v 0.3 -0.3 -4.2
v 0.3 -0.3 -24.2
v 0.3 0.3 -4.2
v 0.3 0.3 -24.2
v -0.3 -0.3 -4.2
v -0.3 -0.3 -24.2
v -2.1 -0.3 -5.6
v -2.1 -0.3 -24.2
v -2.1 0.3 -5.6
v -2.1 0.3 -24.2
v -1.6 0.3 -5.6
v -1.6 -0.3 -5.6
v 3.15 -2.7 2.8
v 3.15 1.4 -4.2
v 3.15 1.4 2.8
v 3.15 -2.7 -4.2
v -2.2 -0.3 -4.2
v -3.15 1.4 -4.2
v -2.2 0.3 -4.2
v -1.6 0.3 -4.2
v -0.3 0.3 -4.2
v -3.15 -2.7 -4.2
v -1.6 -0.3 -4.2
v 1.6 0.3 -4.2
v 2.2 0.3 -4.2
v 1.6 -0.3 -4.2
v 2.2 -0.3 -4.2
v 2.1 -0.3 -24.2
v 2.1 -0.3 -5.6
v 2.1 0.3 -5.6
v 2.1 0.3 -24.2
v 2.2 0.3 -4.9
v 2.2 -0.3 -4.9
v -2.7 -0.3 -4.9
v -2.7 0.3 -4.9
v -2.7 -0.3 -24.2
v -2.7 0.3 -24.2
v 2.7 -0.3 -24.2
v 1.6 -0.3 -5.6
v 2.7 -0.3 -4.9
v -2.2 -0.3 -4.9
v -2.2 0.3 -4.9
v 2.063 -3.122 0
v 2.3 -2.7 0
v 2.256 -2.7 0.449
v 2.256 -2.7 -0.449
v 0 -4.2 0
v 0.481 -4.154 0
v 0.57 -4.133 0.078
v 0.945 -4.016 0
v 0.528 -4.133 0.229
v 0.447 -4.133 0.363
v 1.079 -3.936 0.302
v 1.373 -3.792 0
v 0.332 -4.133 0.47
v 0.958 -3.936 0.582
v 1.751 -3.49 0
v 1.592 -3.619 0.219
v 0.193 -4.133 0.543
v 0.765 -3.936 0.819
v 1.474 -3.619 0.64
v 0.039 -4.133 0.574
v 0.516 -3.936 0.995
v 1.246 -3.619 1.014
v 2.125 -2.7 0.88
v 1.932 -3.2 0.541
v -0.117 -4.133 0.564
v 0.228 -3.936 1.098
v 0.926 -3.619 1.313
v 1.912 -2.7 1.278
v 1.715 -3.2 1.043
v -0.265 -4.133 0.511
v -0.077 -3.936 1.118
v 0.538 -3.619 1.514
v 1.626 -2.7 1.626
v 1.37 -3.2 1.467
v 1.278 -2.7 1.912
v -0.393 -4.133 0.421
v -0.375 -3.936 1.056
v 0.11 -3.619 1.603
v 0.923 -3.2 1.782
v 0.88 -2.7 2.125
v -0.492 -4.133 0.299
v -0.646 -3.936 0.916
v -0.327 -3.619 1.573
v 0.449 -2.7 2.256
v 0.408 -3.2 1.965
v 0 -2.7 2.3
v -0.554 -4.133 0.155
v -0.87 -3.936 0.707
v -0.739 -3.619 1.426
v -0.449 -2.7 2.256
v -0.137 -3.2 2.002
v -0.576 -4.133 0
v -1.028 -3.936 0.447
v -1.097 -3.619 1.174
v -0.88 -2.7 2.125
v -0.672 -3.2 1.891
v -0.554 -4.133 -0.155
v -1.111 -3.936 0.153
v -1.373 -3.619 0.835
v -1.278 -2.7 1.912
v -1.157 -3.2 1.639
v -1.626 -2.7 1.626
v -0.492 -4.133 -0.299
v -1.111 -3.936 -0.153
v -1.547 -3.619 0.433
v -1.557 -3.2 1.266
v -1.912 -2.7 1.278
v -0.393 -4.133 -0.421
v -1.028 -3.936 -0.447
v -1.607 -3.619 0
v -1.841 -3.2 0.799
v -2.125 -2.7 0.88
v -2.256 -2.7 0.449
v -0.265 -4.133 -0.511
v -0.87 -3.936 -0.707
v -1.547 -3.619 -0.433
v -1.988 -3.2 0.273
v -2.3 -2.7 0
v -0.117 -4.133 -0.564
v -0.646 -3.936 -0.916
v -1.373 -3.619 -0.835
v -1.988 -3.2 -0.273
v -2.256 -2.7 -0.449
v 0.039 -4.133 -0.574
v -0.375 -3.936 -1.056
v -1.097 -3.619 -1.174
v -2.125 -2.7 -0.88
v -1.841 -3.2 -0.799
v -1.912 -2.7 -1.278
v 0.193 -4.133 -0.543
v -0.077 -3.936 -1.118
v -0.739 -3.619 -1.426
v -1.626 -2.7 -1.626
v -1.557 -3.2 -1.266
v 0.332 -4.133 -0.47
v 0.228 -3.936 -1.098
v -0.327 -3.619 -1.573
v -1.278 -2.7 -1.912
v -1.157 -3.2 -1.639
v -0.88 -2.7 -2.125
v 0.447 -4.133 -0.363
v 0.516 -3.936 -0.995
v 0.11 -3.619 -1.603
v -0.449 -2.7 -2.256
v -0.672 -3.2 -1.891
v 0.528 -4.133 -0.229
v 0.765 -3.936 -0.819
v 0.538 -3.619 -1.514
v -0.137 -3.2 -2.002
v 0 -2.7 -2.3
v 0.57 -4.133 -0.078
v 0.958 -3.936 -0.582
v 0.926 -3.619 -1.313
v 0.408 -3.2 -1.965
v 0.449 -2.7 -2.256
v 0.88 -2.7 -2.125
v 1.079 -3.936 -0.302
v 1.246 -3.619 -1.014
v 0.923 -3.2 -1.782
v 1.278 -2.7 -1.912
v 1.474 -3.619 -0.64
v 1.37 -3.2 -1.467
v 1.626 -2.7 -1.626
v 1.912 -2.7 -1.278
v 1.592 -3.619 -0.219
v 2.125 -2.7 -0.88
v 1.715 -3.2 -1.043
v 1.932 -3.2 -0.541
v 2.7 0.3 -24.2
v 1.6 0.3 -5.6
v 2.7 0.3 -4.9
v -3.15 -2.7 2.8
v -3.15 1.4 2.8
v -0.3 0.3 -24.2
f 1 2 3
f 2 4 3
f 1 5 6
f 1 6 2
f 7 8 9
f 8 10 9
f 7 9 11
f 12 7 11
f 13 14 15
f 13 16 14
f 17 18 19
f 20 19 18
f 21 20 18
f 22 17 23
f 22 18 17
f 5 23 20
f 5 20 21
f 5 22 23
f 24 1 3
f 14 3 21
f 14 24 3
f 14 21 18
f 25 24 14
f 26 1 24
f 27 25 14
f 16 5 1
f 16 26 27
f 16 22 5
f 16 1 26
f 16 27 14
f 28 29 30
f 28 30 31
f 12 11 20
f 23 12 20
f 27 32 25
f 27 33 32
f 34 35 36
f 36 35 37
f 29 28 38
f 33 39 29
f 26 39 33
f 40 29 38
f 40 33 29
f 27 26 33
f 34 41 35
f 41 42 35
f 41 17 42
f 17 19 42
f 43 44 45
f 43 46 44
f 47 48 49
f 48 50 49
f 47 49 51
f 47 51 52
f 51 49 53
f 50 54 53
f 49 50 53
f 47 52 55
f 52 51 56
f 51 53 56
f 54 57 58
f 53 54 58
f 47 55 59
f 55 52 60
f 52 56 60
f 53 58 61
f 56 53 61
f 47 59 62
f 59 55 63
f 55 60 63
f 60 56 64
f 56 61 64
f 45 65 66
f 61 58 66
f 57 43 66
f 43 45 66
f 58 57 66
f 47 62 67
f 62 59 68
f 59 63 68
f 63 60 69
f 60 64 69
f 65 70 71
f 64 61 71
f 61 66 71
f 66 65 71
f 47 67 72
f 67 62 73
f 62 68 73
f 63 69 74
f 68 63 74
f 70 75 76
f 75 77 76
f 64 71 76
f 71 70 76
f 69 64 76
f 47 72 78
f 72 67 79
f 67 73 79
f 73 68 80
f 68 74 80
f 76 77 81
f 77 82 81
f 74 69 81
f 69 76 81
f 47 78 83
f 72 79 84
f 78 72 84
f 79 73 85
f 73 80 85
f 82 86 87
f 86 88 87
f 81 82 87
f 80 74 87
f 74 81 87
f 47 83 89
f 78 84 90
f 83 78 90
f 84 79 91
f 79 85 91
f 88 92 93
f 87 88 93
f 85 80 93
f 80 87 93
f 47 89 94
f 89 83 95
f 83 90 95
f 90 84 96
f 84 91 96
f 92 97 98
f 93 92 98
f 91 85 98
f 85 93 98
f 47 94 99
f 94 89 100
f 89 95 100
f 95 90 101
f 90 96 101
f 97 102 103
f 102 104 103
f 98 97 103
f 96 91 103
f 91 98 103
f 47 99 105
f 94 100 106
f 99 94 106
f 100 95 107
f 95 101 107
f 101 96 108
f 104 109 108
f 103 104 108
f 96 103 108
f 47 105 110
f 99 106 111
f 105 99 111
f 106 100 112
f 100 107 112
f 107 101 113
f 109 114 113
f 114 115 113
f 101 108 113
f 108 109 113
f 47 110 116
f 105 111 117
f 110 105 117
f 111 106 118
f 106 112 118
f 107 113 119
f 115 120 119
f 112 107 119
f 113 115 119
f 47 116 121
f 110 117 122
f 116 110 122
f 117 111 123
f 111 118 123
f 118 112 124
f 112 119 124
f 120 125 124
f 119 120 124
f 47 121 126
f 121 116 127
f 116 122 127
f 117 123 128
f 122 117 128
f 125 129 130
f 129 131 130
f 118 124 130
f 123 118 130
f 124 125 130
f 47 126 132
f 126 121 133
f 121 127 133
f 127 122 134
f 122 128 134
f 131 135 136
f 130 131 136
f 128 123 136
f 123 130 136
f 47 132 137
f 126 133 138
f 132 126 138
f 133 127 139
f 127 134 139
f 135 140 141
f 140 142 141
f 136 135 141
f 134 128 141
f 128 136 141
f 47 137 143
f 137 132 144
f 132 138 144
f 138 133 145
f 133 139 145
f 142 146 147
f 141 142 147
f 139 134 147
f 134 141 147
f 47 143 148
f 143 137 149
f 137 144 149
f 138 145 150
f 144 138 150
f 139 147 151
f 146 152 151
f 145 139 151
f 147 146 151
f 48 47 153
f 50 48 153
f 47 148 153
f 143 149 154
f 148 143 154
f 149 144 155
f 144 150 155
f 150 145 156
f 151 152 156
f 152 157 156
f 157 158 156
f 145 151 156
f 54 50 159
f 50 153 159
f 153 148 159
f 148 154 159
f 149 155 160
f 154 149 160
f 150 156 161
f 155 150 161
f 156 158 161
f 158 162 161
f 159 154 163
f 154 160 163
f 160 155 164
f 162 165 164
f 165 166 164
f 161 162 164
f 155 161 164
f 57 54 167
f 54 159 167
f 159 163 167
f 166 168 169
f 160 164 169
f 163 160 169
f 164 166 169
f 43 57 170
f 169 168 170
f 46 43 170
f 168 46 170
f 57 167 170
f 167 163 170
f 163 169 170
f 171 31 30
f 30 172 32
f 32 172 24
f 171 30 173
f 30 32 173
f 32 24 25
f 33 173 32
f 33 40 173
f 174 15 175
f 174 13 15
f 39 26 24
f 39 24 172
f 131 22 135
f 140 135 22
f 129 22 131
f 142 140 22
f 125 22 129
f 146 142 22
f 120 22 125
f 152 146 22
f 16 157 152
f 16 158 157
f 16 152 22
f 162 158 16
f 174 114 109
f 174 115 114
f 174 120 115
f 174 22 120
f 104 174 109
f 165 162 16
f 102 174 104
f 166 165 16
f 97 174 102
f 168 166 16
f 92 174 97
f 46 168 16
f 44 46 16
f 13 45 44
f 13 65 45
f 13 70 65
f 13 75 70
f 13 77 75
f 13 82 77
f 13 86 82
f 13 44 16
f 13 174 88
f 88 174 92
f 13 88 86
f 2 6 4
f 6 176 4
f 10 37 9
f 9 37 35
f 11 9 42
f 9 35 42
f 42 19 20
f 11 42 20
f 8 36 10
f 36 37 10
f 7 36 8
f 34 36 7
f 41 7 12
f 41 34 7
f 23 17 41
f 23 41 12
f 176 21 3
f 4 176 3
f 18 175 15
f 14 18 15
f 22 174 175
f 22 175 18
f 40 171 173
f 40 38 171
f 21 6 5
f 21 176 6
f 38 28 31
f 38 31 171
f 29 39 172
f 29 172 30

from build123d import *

# Parameters (mm, degrees)
F1_DEPTH      = 2.7
F1_DEPTH_BACK = 1.4
F0_W          = 0.6
F0_H          = 20
F2_DEPTH      = 0.3


with BuildPart() as f1:
    # F0 (on Front) → F1 (new body, two sides)
    with BuildSketch(Plane.XZ) as f1_sk:
        Polygon((3.15, 2.8), (-3.15, 2.8), (-3.15, -4.2), (-2.2, -4.2), (-1.6, -4.2), (-0.3, -4.2), (0.3, -4.2), (1.6, -4.2), (2.2, -4.2), (3.15, -4.2), align=None)
    extrude(amount=F1_DEPTH)
    extrude(f1_sk.sketch, amount=-F1_DEPTH_BACK)

    # F0 (on Front) → F2 (join, symmetric)
    with BuildSketch(Plane.XZ):
        Polygon((-1.6, -4.2), (-2.2, -4.2), (-2.2, -4.9), (-2.7, -4.9), (-2.7, -24.2), (-2.1, -24.2), (-2.1, -5.6), (-1.6, -5.6), align=None)
        with Locations((0, -14.2)):
            Rectangle(F0_W, F0_H)
        Polygon((2.2, -4.9), (2.2, -4.2), (1.6, -4.2), (1.6, -5.6), (2.1, -5.6), (2.1, -24.2), (2.7, -24.2), (2.7, -4.9), align=None)
    extrude(amount=F2_DEPTH, both=True)

    # F3 (on Top) → F4 (revolve)
    with BuildSketch(Plane.XY):
        with BuildLine():
            ThreePointArc((0, -4.2), (1.3729530218, -3.7918613001), (2.3, -2.7))
            Line((2.3, -2.7), (0, -2.7))
            Line((0, -2.7), (0, -4.2))
        make_face()
    revolve(axis=Axis((0, -4.0003820322, 0), (0, -1, 0)))


solid = f1.part
